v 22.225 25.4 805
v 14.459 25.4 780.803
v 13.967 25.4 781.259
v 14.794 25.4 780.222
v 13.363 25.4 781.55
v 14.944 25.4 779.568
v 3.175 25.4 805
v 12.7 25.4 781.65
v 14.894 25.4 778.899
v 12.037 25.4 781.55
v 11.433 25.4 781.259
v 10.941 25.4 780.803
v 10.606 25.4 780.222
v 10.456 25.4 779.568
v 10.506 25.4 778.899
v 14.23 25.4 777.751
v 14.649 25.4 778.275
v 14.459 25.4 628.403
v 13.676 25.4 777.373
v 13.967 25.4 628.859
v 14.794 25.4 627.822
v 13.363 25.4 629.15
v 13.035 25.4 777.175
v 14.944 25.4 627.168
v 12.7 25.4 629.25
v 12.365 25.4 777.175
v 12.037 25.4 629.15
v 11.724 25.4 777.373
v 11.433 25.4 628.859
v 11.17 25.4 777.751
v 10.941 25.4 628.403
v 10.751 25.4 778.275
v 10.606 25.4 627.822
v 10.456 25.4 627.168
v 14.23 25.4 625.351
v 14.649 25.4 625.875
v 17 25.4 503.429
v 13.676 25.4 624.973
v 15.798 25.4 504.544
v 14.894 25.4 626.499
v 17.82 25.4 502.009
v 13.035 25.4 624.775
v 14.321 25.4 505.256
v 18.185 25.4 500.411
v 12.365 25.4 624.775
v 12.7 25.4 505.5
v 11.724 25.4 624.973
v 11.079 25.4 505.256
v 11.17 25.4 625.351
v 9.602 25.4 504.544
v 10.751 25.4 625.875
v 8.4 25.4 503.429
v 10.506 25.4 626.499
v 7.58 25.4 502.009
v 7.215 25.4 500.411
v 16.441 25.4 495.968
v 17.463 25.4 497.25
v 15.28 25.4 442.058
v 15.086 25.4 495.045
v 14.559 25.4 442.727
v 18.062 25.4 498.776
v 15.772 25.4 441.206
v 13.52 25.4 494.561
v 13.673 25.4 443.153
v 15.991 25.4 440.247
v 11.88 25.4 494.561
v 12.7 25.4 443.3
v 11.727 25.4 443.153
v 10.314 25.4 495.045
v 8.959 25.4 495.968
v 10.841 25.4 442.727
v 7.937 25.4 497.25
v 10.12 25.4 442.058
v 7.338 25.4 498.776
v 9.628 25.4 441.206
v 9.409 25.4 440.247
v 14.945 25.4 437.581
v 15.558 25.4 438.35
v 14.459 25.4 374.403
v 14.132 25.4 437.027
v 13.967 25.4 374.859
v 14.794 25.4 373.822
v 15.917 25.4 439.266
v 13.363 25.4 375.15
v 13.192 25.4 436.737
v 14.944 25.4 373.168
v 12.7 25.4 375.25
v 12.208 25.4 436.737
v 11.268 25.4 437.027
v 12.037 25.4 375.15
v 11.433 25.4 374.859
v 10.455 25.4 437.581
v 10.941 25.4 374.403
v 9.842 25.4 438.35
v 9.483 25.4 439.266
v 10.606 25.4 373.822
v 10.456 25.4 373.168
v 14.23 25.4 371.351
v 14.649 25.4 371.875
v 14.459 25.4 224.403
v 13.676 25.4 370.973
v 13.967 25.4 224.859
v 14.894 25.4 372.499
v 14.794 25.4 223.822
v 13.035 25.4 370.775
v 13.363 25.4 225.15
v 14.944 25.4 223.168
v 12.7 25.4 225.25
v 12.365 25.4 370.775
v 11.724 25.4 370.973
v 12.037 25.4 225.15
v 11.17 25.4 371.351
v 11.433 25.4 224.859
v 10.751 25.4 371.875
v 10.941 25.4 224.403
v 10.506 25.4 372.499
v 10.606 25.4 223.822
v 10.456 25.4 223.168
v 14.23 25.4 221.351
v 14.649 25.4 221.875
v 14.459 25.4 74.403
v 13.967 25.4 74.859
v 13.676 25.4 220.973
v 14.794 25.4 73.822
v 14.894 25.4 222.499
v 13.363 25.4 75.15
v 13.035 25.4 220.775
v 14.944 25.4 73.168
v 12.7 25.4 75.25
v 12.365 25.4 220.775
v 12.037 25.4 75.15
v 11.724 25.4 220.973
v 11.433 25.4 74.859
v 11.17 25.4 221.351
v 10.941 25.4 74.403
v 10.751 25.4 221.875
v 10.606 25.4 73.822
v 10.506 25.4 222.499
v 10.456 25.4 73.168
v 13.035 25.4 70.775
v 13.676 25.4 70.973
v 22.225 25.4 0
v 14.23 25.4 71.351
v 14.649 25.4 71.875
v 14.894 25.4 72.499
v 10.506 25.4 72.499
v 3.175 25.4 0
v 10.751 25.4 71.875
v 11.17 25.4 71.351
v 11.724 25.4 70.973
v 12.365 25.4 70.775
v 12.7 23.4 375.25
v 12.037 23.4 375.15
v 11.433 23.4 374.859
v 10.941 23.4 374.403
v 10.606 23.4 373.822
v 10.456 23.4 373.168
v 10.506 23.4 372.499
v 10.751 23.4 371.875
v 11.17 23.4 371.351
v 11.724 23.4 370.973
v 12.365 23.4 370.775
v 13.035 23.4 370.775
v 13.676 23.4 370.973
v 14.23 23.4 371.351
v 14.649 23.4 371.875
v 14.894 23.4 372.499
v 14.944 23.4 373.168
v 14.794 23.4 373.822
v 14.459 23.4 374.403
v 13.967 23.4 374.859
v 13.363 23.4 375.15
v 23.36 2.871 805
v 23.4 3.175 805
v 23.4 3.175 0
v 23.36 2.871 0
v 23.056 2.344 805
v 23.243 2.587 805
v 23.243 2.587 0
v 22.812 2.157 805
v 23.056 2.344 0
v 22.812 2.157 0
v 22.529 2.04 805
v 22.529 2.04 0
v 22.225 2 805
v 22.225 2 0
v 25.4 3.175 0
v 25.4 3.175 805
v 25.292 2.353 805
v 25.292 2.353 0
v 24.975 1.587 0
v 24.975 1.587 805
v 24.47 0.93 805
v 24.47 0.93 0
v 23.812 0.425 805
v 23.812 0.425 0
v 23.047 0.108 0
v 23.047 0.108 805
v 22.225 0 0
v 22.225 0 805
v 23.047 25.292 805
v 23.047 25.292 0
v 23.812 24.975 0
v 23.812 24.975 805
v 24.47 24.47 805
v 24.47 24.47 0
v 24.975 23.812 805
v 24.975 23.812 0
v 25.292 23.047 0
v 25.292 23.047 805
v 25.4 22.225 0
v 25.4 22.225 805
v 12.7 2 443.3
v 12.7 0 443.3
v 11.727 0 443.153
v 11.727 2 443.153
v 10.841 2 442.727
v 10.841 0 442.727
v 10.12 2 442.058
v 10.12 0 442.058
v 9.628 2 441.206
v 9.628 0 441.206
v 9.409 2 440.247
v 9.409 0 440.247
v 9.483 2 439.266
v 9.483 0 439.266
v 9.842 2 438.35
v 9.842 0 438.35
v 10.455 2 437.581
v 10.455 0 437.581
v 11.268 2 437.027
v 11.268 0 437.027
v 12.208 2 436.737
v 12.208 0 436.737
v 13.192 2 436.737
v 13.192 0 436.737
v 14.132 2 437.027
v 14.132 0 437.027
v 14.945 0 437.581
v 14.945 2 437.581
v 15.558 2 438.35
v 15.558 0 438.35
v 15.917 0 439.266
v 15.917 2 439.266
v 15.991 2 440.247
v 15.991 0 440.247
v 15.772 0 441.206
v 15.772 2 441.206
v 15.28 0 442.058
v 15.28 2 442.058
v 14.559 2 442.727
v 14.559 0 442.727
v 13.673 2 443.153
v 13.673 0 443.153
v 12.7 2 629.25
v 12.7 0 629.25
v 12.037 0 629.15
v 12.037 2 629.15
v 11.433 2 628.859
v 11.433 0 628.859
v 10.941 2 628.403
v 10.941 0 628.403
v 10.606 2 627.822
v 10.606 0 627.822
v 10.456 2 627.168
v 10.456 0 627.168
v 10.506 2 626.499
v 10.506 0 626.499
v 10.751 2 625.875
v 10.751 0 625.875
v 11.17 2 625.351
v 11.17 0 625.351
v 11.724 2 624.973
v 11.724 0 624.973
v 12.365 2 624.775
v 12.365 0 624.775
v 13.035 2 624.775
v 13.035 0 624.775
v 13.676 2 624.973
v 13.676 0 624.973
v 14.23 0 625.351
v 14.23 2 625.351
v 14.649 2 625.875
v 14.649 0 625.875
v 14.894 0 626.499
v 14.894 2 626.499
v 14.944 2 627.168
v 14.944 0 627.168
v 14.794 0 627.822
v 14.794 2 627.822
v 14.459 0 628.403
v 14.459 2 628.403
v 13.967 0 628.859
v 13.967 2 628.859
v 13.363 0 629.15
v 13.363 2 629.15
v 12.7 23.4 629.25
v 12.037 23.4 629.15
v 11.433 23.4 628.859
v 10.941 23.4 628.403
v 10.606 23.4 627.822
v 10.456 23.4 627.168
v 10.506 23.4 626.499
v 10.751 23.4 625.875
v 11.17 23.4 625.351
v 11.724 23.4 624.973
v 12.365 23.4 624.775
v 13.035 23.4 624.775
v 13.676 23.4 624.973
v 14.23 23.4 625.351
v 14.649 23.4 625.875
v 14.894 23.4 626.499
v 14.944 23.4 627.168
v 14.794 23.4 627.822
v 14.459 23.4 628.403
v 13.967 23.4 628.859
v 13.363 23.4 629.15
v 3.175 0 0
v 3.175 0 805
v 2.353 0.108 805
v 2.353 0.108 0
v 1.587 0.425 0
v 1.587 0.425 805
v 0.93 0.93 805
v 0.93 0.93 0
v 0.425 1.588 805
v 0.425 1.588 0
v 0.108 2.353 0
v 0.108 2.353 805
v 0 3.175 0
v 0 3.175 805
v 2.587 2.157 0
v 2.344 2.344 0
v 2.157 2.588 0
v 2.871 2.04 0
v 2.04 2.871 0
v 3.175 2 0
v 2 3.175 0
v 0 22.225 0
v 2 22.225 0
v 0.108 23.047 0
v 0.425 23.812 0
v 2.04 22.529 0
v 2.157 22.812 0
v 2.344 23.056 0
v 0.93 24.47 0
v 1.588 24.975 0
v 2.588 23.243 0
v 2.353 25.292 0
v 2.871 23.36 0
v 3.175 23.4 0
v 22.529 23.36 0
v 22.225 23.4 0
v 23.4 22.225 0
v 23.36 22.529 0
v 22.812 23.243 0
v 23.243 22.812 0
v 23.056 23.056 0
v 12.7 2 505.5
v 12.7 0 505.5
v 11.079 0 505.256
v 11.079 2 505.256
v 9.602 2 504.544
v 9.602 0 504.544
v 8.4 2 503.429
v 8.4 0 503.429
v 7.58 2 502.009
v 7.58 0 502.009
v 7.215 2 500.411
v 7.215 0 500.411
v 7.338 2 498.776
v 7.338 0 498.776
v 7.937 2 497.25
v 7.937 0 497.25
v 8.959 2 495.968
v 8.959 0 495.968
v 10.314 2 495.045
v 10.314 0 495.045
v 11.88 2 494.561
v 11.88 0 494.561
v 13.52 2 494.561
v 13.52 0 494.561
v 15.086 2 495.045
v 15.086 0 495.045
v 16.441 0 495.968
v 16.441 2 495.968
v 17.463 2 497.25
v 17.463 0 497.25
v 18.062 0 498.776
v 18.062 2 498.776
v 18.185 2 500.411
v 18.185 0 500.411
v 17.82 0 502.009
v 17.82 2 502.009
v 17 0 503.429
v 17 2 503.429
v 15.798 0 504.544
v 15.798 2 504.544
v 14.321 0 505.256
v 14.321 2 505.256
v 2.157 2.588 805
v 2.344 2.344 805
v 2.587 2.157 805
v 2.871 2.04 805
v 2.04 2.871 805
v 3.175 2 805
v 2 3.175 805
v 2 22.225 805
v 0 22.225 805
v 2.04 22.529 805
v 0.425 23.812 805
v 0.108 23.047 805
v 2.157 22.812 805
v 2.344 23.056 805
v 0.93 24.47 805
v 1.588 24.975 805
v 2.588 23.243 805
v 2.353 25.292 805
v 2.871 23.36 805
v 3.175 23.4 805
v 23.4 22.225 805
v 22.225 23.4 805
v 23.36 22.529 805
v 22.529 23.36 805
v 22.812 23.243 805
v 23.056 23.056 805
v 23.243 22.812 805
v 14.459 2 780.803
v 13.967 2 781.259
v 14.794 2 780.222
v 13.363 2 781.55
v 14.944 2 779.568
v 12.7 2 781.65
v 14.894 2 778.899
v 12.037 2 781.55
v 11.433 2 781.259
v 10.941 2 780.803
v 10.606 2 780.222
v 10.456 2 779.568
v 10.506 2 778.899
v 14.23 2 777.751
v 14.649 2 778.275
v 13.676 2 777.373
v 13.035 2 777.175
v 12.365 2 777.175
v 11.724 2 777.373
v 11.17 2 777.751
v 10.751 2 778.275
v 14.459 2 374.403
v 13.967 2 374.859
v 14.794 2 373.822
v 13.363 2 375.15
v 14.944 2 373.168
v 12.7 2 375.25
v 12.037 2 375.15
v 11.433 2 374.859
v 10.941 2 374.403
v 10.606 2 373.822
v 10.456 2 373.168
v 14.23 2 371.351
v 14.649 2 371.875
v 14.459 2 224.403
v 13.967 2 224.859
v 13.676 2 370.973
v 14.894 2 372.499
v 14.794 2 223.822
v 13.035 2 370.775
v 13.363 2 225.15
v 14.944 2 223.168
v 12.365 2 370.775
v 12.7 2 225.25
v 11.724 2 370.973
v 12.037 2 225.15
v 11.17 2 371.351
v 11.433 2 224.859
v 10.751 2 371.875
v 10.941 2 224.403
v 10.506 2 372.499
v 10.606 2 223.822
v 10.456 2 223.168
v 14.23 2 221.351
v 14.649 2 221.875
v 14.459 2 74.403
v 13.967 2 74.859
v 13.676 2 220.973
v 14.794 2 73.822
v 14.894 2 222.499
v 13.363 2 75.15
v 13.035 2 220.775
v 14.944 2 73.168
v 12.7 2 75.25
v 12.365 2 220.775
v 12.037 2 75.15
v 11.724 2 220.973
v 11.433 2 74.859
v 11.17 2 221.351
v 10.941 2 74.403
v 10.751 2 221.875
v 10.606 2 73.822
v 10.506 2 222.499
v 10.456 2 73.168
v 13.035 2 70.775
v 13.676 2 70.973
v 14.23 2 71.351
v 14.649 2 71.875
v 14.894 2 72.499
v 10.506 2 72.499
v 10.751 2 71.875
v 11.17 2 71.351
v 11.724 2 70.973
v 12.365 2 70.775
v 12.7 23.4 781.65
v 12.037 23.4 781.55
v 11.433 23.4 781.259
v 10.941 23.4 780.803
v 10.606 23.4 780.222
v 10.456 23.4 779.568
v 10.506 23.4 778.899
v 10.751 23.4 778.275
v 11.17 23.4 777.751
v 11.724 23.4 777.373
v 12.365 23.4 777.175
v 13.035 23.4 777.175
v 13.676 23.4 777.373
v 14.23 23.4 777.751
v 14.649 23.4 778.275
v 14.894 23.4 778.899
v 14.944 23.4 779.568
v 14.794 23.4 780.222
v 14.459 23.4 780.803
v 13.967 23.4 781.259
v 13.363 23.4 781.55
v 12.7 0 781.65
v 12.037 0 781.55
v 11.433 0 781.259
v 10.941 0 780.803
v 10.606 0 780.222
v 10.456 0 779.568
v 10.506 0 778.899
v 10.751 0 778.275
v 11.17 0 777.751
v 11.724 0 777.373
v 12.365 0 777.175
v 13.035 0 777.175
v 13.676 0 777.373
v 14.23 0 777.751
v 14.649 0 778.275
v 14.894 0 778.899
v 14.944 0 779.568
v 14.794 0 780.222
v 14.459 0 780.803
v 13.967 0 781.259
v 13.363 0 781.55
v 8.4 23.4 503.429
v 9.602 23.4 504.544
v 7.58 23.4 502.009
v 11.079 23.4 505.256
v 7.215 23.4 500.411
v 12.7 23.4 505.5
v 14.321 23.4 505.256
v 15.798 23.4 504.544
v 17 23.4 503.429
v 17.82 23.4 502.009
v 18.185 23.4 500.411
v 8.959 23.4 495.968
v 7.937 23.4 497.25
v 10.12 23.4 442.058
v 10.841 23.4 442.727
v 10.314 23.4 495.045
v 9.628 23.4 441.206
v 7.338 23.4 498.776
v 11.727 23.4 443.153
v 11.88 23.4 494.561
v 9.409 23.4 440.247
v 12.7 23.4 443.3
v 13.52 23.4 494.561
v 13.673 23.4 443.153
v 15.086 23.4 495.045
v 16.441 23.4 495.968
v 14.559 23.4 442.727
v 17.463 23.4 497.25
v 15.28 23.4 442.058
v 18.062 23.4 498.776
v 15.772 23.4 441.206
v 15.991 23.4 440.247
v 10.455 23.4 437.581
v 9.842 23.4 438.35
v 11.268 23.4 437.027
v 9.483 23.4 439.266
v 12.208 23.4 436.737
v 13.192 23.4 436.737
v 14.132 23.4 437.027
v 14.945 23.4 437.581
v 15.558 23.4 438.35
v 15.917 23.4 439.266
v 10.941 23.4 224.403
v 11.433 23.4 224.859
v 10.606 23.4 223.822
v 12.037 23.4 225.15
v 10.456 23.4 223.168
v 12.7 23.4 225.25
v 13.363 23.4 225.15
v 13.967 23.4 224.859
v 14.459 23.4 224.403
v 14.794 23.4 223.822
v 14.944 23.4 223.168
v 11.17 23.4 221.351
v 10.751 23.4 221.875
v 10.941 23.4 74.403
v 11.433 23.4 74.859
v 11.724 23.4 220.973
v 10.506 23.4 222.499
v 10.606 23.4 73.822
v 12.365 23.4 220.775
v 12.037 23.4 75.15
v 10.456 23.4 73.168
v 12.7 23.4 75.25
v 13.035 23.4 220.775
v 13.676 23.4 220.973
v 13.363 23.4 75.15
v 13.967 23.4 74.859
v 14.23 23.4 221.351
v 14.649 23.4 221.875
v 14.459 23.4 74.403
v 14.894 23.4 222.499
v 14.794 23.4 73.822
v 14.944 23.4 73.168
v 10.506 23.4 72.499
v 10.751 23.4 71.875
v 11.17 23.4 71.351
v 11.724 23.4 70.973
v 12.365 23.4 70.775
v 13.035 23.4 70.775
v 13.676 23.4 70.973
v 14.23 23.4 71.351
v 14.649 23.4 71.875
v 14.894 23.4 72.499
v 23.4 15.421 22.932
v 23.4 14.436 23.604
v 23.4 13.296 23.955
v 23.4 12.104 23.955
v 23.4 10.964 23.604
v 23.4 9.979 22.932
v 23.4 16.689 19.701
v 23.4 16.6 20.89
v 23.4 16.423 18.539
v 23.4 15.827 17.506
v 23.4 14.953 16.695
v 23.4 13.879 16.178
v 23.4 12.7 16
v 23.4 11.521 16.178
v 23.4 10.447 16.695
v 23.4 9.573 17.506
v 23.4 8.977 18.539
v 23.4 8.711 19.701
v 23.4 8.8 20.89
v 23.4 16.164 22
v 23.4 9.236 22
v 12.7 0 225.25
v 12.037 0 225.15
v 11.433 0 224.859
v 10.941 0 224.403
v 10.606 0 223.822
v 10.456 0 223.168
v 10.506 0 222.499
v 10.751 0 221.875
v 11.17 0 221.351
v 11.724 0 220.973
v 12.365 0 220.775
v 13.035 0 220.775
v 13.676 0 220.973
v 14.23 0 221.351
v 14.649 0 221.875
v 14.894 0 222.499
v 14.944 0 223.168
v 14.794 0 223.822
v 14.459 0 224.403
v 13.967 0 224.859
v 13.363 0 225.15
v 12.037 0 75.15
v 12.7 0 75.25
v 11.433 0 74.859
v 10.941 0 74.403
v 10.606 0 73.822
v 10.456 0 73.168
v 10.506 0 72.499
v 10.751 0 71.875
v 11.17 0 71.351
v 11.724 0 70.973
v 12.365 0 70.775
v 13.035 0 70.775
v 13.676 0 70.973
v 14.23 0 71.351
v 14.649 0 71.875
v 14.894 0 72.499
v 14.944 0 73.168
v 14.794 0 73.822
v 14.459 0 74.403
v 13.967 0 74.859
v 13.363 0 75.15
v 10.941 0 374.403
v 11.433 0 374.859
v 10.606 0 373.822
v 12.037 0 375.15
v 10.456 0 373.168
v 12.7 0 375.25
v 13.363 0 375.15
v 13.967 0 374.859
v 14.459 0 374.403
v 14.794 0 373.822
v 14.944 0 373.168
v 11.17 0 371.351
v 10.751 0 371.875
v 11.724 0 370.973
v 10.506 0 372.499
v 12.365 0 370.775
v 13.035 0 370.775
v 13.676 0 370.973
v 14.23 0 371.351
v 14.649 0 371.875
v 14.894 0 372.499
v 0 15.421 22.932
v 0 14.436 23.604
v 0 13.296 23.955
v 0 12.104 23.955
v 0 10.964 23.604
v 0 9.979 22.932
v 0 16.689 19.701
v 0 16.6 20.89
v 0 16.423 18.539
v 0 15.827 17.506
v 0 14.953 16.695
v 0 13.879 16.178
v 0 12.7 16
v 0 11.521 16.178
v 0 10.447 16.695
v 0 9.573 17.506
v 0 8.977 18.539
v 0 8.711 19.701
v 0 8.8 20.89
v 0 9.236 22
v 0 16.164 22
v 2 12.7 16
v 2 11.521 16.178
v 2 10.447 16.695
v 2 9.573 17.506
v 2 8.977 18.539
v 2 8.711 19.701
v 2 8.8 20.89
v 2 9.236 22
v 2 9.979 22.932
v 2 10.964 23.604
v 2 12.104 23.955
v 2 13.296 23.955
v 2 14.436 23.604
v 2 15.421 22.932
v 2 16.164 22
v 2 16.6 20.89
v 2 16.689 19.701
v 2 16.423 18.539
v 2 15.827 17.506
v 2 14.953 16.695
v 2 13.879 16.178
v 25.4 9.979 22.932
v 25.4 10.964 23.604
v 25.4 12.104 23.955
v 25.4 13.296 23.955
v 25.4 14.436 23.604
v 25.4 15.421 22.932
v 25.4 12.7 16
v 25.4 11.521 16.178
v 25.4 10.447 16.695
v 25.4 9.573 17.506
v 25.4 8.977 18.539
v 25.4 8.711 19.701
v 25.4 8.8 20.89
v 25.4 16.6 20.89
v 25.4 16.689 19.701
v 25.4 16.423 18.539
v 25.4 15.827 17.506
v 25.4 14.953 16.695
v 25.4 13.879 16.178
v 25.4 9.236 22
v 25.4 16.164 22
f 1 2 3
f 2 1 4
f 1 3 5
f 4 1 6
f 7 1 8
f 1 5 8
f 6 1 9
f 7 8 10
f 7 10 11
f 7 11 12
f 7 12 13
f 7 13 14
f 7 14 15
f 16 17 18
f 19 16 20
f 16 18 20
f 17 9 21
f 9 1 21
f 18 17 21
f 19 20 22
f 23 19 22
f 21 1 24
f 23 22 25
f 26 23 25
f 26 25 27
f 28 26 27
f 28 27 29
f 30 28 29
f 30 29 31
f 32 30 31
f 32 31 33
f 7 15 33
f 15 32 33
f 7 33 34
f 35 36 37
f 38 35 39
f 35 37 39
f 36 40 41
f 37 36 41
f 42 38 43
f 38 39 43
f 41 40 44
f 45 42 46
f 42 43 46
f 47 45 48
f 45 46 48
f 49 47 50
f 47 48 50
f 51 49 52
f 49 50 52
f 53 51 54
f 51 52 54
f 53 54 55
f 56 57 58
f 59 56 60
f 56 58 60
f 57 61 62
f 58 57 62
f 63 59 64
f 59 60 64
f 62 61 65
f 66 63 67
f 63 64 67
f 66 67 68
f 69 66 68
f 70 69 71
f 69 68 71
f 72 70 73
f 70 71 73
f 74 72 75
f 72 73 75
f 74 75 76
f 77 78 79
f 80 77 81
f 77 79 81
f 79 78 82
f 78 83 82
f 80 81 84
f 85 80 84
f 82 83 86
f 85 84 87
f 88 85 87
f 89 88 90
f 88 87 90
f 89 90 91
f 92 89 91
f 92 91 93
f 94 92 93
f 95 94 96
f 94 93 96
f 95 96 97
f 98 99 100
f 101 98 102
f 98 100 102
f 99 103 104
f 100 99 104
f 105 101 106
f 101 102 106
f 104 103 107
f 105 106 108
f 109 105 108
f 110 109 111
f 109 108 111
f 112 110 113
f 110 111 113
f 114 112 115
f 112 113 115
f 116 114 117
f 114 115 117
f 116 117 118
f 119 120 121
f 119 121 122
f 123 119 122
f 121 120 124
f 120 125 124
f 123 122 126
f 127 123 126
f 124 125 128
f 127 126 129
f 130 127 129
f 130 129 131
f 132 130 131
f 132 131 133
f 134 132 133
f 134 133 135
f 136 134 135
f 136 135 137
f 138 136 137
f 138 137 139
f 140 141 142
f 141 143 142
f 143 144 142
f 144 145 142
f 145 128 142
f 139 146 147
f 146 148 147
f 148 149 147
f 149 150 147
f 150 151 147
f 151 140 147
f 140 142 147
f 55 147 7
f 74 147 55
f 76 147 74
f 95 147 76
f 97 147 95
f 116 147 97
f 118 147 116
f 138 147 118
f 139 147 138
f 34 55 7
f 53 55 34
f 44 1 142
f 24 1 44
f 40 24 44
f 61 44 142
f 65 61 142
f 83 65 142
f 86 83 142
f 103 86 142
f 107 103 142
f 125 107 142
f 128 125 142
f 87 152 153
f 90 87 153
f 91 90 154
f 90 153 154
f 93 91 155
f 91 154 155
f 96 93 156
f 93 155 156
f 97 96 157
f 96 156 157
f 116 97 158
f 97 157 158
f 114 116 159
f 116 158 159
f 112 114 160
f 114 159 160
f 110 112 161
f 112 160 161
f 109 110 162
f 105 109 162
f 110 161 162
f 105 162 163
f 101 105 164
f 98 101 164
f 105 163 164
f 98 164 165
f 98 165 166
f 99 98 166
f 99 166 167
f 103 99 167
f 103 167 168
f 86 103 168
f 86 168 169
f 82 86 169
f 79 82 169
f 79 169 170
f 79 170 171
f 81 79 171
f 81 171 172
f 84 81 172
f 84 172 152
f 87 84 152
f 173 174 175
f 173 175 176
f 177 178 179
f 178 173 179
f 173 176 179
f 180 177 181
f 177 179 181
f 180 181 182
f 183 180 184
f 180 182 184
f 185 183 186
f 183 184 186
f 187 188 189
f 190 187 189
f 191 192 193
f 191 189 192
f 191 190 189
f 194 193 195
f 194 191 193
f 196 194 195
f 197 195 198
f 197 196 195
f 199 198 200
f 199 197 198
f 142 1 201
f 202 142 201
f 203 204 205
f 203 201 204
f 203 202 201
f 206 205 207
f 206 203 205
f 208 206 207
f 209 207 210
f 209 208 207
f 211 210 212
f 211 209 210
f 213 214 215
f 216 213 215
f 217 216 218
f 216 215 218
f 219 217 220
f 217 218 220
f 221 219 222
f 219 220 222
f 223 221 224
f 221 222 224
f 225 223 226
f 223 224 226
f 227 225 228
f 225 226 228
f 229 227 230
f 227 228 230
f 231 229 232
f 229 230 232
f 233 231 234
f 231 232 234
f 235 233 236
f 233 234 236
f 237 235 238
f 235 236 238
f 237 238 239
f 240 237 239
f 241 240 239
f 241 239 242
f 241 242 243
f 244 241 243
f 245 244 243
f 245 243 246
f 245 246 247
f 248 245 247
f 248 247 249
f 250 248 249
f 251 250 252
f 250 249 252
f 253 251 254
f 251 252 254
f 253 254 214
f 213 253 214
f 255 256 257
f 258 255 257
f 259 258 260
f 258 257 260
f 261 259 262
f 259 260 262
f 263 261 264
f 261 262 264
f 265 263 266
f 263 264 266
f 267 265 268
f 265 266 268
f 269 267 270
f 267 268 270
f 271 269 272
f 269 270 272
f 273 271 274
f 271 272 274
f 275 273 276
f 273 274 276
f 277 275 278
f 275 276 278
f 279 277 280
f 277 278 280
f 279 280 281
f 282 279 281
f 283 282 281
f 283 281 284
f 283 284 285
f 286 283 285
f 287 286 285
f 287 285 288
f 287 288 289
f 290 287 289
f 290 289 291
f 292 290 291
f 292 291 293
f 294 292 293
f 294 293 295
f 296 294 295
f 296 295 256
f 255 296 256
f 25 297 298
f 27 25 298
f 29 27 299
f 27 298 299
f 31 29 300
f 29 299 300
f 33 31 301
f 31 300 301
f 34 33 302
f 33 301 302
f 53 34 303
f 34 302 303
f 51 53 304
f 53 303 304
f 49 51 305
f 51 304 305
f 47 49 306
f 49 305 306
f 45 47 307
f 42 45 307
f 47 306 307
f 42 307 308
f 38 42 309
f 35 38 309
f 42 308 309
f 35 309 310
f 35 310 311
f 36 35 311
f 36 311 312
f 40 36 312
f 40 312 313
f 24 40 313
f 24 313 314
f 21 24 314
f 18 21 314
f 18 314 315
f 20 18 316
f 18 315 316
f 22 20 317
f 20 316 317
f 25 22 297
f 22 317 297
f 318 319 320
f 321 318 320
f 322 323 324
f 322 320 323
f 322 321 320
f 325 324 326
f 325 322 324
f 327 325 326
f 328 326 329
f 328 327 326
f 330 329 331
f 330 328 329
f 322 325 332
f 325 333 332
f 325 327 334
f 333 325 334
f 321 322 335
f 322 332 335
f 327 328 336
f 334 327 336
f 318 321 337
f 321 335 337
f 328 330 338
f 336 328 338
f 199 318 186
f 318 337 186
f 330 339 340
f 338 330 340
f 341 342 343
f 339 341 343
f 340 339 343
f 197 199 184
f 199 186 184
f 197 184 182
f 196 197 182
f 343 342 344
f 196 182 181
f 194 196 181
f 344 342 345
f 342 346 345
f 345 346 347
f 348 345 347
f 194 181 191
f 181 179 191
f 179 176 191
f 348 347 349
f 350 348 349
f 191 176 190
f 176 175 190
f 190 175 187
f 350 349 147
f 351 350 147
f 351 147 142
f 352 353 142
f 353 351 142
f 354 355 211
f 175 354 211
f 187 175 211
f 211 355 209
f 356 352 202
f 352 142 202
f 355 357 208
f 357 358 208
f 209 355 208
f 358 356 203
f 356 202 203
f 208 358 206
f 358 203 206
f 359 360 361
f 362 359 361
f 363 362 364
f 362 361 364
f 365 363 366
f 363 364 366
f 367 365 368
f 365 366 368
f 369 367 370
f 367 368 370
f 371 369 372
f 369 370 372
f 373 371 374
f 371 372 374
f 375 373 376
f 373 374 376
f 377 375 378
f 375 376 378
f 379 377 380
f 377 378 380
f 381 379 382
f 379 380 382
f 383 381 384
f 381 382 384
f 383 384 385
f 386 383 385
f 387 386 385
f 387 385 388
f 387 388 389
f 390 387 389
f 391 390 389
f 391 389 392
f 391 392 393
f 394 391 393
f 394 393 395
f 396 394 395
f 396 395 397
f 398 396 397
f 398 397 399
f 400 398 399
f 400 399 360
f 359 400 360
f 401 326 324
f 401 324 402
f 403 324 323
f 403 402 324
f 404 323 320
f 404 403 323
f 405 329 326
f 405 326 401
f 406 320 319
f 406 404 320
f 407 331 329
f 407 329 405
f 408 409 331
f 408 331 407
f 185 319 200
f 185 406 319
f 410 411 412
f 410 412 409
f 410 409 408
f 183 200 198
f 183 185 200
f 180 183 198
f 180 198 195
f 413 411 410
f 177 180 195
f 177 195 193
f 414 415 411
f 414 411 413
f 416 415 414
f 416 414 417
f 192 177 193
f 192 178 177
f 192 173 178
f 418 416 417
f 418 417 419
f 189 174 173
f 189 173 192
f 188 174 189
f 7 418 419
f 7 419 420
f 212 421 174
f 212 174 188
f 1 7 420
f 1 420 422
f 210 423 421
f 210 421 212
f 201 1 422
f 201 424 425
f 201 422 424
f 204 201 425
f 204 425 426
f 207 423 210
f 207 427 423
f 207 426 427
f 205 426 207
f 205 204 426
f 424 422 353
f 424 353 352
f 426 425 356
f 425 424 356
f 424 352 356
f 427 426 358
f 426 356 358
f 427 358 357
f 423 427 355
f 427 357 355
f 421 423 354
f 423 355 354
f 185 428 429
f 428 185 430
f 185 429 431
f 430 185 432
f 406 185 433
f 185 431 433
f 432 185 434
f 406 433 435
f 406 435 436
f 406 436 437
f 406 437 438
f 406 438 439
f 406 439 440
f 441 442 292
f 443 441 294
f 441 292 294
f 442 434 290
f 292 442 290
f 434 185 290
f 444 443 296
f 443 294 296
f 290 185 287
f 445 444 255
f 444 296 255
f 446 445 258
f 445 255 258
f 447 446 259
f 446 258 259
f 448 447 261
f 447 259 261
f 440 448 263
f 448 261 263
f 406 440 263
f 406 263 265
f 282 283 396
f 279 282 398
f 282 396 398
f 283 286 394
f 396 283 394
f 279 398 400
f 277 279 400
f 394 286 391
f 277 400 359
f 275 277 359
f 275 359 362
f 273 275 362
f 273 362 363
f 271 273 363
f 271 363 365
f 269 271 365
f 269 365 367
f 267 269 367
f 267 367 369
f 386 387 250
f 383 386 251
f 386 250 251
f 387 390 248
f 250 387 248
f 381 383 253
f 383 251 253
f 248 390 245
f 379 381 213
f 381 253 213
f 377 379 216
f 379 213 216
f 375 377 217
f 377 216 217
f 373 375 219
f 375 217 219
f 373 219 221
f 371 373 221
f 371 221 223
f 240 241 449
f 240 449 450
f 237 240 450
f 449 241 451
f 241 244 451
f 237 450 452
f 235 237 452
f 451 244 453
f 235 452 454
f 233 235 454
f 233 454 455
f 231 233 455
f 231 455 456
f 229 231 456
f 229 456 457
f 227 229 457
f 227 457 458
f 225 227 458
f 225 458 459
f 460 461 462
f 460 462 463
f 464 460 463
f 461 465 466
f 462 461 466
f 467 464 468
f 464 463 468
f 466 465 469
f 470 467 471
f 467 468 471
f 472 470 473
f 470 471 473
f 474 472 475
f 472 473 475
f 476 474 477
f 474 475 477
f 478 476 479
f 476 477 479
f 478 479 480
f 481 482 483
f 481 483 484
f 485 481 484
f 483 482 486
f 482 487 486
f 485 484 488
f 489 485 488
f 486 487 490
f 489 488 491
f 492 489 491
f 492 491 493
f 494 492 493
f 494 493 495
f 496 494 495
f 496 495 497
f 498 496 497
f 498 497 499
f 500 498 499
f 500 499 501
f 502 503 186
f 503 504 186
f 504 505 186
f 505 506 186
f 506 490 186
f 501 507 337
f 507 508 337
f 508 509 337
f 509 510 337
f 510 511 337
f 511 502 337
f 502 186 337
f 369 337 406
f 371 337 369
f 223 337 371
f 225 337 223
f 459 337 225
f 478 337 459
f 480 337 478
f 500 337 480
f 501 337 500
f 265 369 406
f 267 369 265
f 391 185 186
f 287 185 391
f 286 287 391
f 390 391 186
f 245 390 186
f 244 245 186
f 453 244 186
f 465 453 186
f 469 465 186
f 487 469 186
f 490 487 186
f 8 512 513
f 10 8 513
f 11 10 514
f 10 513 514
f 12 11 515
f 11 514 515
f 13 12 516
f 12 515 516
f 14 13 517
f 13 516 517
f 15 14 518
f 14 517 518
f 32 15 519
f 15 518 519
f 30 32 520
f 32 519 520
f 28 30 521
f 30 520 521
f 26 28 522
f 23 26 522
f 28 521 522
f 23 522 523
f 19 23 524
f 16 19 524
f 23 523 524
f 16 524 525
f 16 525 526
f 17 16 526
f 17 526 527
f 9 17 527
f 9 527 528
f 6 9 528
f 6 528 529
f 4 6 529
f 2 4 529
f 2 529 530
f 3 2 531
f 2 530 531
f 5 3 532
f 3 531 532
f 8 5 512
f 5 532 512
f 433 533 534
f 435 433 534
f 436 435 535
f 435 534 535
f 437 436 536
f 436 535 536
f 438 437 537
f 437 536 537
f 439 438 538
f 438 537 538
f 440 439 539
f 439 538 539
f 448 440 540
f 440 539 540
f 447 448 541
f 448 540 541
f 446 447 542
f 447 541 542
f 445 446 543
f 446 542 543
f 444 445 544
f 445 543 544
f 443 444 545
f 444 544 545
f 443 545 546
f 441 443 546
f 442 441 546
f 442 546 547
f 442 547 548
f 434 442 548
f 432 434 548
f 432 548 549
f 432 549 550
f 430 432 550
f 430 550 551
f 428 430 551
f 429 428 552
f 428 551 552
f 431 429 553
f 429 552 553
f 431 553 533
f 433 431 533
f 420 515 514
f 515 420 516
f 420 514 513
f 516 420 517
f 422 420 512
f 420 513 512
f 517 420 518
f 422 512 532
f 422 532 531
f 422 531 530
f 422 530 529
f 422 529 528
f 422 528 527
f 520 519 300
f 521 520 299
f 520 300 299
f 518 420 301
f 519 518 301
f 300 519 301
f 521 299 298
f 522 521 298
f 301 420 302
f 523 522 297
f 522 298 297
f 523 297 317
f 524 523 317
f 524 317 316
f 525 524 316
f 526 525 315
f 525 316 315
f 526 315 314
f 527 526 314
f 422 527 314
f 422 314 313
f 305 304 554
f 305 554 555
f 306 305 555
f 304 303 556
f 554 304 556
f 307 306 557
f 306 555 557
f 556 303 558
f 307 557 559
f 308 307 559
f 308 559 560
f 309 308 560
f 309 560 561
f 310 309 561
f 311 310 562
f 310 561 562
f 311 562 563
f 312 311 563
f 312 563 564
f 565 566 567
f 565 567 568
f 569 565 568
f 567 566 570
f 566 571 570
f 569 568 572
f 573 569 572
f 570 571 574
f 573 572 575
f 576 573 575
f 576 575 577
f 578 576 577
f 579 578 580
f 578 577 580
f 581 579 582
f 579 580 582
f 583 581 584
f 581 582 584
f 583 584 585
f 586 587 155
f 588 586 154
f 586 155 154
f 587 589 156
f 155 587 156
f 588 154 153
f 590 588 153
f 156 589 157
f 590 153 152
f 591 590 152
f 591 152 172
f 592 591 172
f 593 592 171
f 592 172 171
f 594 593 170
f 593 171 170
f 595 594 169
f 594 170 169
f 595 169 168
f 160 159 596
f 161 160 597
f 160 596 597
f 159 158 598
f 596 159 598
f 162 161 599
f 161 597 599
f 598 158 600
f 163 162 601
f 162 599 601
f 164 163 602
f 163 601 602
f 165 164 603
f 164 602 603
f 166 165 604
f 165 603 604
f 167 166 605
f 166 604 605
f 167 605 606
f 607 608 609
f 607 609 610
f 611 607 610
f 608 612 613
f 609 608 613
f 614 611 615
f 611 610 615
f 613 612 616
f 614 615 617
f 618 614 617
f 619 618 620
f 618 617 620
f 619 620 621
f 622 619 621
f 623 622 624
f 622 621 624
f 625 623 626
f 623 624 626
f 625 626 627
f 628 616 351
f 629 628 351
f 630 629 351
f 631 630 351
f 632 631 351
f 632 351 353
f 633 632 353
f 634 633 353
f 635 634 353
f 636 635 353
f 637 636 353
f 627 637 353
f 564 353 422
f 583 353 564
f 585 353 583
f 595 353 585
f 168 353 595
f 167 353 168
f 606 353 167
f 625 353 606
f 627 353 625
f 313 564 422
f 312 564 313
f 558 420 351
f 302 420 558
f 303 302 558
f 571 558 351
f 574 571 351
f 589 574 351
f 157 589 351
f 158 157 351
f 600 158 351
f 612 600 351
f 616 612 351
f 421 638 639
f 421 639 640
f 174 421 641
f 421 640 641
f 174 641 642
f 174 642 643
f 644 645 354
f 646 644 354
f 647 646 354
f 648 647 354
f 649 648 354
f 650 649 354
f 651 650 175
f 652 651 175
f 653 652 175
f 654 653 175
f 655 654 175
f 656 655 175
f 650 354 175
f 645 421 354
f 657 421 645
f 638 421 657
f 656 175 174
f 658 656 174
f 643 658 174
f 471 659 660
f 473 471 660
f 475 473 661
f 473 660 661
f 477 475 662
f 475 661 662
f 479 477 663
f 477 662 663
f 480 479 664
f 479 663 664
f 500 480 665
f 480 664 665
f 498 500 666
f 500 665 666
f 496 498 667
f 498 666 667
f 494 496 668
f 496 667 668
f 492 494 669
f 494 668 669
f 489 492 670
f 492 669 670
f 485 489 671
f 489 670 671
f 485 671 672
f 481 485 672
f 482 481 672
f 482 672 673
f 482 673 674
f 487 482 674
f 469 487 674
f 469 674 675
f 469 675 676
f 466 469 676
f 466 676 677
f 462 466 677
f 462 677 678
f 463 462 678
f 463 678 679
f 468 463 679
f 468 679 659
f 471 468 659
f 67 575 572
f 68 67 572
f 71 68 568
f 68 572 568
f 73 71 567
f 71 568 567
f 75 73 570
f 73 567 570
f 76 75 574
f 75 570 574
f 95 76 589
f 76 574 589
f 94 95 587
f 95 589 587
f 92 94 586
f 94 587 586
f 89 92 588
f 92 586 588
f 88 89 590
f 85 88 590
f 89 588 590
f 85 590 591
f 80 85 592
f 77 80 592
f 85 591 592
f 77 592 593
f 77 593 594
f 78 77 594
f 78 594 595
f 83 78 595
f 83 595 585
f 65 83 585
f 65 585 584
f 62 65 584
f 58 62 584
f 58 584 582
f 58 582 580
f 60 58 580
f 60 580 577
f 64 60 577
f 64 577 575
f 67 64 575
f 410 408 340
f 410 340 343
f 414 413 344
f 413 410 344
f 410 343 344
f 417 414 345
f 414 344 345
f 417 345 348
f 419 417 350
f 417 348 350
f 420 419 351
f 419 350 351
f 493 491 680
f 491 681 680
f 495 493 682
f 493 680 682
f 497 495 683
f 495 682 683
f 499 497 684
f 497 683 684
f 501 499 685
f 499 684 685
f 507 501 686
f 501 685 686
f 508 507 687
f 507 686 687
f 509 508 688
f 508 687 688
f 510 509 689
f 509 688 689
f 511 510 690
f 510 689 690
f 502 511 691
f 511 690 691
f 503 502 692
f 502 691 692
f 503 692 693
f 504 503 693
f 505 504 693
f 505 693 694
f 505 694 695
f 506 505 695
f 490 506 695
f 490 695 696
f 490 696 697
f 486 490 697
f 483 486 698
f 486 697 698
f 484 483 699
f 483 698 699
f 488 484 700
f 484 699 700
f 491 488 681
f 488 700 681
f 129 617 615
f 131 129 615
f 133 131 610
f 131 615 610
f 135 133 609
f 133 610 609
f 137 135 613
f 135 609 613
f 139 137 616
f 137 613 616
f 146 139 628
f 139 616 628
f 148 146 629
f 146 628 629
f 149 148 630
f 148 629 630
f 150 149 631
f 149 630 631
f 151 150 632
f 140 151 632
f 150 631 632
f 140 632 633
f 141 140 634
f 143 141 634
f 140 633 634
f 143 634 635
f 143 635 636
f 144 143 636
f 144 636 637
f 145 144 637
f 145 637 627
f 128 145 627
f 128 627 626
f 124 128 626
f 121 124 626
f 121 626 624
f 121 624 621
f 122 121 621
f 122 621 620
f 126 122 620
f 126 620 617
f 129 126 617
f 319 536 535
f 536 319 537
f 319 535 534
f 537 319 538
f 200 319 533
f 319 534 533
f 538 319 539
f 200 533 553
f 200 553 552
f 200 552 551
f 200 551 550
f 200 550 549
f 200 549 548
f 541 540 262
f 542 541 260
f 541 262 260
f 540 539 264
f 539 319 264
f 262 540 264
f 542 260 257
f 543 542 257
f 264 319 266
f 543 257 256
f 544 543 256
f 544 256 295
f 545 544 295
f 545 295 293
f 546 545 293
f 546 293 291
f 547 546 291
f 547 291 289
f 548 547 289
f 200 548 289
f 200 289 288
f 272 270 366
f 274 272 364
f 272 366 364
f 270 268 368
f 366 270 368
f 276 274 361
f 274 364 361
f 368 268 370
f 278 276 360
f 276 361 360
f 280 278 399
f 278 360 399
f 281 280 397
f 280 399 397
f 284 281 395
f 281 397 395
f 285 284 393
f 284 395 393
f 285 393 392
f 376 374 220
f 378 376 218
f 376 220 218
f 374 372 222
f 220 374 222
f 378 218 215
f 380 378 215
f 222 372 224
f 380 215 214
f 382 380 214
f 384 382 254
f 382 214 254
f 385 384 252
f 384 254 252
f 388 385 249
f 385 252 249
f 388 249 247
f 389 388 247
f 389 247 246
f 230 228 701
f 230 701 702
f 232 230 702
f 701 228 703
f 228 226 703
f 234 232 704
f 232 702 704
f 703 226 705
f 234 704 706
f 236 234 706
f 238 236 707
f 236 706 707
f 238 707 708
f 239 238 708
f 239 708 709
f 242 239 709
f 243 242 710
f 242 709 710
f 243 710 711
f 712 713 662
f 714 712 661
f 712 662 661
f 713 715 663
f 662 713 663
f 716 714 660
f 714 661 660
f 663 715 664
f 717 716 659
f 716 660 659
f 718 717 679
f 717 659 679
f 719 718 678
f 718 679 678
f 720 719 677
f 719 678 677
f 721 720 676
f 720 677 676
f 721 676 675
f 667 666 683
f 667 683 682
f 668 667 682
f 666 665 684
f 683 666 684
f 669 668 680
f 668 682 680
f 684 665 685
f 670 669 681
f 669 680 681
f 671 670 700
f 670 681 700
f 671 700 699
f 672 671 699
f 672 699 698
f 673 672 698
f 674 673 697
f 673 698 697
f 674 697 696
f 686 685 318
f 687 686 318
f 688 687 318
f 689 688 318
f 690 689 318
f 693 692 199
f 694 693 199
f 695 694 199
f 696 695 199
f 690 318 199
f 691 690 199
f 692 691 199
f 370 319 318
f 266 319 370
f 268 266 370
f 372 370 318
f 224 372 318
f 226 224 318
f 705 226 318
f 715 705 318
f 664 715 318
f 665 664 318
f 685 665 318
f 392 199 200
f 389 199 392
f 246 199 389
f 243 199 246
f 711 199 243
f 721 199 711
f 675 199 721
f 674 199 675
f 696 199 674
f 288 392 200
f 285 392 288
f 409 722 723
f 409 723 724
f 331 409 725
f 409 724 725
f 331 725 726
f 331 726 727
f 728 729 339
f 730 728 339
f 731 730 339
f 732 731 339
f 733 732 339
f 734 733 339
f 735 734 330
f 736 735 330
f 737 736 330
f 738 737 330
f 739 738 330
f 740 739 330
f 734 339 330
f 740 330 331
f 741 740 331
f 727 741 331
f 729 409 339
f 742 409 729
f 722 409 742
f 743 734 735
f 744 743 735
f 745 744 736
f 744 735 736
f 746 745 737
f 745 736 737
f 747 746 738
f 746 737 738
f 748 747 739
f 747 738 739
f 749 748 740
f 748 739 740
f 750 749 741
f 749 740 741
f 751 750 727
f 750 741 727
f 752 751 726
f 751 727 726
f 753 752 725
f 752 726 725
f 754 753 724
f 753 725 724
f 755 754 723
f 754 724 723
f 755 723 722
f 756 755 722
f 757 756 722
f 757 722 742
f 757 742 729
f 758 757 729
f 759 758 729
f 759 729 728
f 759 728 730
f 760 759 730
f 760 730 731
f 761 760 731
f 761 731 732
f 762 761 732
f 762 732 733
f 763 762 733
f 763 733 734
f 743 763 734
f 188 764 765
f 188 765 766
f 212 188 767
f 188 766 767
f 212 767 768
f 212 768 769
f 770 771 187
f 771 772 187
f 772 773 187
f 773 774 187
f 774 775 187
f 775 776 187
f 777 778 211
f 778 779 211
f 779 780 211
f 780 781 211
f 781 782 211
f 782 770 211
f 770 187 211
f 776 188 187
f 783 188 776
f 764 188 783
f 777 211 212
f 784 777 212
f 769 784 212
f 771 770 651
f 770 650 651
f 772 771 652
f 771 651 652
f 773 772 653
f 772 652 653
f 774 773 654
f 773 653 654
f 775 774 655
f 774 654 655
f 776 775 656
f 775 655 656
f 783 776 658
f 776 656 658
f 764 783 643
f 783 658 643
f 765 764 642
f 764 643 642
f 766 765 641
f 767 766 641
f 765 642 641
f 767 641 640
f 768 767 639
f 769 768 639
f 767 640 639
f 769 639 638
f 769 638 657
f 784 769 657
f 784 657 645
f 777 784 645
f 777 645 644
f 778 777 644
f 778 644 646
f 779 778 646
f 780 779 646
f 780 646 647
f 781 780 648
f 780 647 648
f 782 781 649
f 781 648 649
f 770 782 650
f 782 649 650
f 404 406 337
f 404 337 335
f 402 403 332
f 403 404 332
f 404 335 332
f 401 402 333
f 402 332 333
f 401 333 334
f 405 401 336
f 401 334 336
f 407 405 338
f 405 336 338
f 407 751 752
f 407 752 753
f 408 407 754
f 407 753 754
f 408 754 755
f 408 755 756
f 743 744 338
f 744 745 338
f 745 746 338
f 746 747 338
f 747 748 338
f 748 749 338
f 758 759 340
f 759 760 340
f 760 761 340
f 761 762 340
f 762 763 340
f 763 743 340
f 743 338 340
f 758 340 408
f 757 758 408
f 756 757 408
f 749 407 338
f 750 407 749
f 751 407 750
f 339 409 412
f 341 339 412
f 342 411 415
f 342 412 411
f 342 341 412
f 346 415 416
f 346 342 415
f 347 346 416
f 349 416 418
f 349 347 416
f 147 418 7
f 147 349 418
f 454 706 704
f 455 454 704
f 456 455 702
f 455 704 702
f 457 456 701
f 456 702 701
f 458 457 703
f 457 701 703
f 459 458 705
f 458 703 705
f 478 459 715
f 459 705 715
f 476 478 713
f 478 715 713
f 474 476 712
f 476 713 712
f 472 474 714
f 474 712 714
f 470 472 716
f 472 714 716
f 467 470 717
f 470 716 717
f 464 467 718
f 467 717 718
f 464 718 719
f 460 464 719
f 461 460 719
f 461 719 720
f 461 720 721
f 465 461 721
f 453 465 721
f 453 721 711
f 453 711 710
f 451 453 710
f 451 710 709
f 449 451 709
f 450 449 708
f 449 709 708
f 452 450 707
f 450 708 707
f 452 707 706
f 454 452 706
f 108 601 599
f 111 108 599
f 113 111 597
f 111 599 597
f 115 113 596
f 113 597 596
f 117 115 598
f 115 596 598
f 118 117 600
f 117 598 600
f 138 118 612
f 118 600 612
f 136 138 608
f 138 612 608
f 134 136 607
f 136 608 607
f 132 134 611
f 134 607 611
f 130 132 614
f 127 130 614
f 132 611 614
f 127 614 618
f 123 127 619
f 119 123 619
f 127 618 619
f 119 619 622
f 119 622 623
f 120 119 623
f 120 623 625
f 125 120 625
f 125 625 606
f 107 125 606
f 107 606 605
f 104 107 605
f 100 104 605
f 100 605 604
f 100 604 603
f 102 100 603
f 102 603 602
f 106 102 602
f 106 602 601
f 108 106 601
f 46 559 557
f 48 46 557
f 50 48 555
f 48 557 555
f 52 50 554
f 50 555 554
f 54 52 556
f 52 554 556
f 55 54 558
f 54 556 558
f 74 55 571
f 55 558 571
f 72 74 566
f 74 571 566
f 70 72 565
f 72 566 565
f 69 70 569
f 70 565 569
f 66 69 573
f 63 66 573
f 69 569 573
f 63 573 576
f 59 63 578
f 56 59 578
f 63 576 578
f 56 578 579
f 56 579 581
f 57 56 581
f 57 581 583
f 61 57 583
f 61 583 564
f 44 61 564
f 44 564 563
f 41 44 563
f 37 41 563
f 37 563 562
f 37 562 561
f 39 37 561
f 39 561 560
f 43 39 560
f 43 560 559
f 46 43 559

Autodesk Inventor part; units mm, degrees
ref_plane "YZ Plane" through (0, 0, 0) normal (1, 0, 0) x (0, 1, 0)
ref_plane "XZ Plane" through (0, 0, 0) normal (0, 1, 0) x (-1, 0, 0)
ref_plane "XY Plane" through (0, 0, 0) normal (0, 0, 1) x (1, 0, 0)
sketch "Sketch1" plane through (0, 0, 0) normal (0, 0, 1) x (1, 0, 0)
  line L0 (3.175, 0) -> (22.225, 0)
  line L1 (25.4, 3.175) -> (25.4, 22.225)
  line L2 (22.225, 25.4) -> (3.175, 25.4)
  line L3 (0, 22.225) -> (0, 3.175)
  arc A0 (3.175, 25.4) -> (0, 22.225) centre (3.175, 22.225) ccw
  arc A1 (0, 3.175) -> (3.175, 0) centre (3.175, 3.175) ccw
  arc A2 (22.225, 0) -> (25.4, 3.175) centre (22.225, 3.175) ccw
  arc A3 (25.4, 22.225) -> (22.225, 25.4) centre (22.225, 22.225) ccw
  line L4 (3.175, 23.4) -> (22.225, 23.4)
  arc A4 (23.4, 22.225) -> (22.225, 23.4) centre (22.225, 22.225) ccw
  line L5 (23.4, 22.225) -> (23.4, 3.175)
  arc A5 (22.225, 2) -> (23.4, 3.175) centre (22.225, 3.175) ccw
  line L6 (22.225, 2) -> (3.175, 2)
  arc A6 (2, 3.175) -> (3.175, 2) centre (3.175, 3.175) ccw
  line L7 (2, 3.175) -> (2, 22.225)
  arc A7 (3.175, 23.4) -> (2, 22.225) centre (3.175, 22.225) ccw
  point P0 (0, 0)
  point P1 (25.4, 0)
  point P2 (0, 25.4)
  dimension "d0" = 25.4
  dimension "d1" = 25.4
  dimension "d2" = 3.175
  dimension "d3" = 2
extrude "Extrusion1" add sketch "Sketch1" along normal blind 1000
sketch "Sketch11" plane through (3.175, 25.4, 1000) normal (0, 1, 0) x (1, 0, 0)
  circle A0 centre (9.525, 500) radius 4.7917
  point P0 (-3.175, 1000)
hole "centerHole" at (12.7, 25.4, 500) direction (0, -1, 0) diameter 11 end through all clearance for "Flat Head Machine Screw" size "M10" standard "Ansi Metric M Profile"
sketch "Sketch12" plane through (3.175, 25.4, 1000) normal (0, 1, 0) x (1, 0, 0)
  line L0 (0, 1000) -> (0, 0) projected
  circle A0 centre (9.525, 927) radius 1.5875
  circle A1 centre (9.525, 777) radius 1.5875
  circle A2 centre (9.525, 627) radius 1.5875
  circle A3 centre (9.525, 500) radius 5.5 projected
  point P0 (-3.175, 1000)
  dimension "d76" = 3.175
  dimension "d80" = 150
  dimension "d140" = 127
hole "longSideHoles" at (12.7, 25.4, 73) at (12.7, 25.4, 223) at (12.7, 25.4, 373) direction (0, -1, 0) diameter 4.5 end through all clearance for "Flat Head Machine Screw" size "M4" standard "Ansi Metric M Profile"
sketch "Sketch13" plane through (3.175, 25.4, 1000) normal (0, 1, 0) x (1, 0, 0)
  line L0 (0, 1000) -> (0, 0) projected
  circle A0 centre (9.525, 68.2) radius 1.5875
  circle A1 centre (9.525, 220.6) radius 1.5875
  circle A2 centre (9.525, 373) radius 1.5875
  circle A3 centre (9.525, 500) radius 5.5 projected
  point P0 (-3.175, 1000)
  dimension "d96" = 152.4
  dimension "d137" = 127
  dimension "d138" = 152.4
hole "shortSideHoles" at (12.7, 25.4, 627) at (12.7, 25.4, 779.4) at (12.7, 25.4, 931.8) direction (0, -1, 0) diameter 4.5 end through all clearance for "Flat Head Machine Screw" size "M4" standard "Ansi Metric M Profile"
sketch "Sketch14" plane through (25.4, 22.225, 1000) normal (1, 0, 0) x (0, 0, -1)
  line L0 (1000, -19.05) -> (1000, 0) projected
  line L1 (0, -19.05) -> (0, 0) projected
  circle A0 centre (30, -9.525) radius 4.7625
  circle A1 centre (980, -9.525) radius 4.7625
  point P0 (1000, -22.225)
  dimension "d108" = 9.525
  dimension "d109" = 30
  dimension "d110" = 9.525
  dimension "d111" = 20
hole "shackleHole" at (25.4, 12.7, 970) at (25.4, 12.7, 20) direction (-1, 0, 0) diameter 8 end through all
sketch "Sketch15" plane through (3.175, 25.4, 1000) normal (0, 1, 0) x (1, 0, 0)
  circle A0 centre (9.525, 500) radius 5.5 projected
  circle A1 centre (9.525, 560) radius 3.175
  point P0 (-3.175, 1000)
  dimension "d119" = 6.35
  dimension "d120" = 60
hole "collarHole" at (12.7, 25.4, 440) direction (0, -1, 0) diameter 6.6 end through all clearance for "Flat Head Machine Screw" size "M6" standard "Ansi Metric M Profile"
sketch "Sketch16" plane through (0, 0, 1000) normal (0, 0, 1) x (1, 0, 0)
  arc A0 (23.4, 22.225) -> (22.225, 23.4) centre (22.225, 22.225) ccw projected
  line L0 (23.4, 22.225) -> (23.4, 3.175) projected
  arc A1 (22.225, 2) -> (23.4, 3.175) centre (22.225, 3.175) ccw projected
  line L1 (22.225, 2) -> (3.175, 2) projected
  arc A2 (2, 3.175) -> (3.175, 2) centre (3.175, 3.175) ccw projected
  line L2 (2, 3.175) -> (2, 22.225) projected
  arc A3 (3.175, 23.4) -> (2, 22.225) centre (3.175, 22.225) ccw projected
  line L3 (3.175, 23.4) -> (22.225, 23.4) projected
  line L4 (0, 22.225) -> (0, 3.175) projected
  arc A4 (0, 3.175) -> (3.175, 0) centre (3.175, 3.175) ccw projected
  line L5 (3.175, 0) -> (22.225, 0) projected
  arc A5 (22.225, 0) -> (25.4, 3.175) centre (22.225, 3.175) ccw projected
  line L6 (25.4, 3.175) -> (25.4, 22.225) projected
  arc A6 (25.4, 22.225) -> (22.225, 25.4) centre (22.225, 22.225) ccw projected
  line L7 (22.225, 25.4) -> (3.175, 25.4) projected
  arc A7 (3.175, 25.4) -> (0, 22.225) centre (3.175, 22.225) ccw projected
  point P0 (0, 0)
extrude "removeSide" cut sketch "Sketch16" against normal blind 195
equation "\"d0\" = tube"
equation "\"d1\" = tube"
equation "\"tube\" = 25.4"
properties part number "2f2al" material "Steel"
